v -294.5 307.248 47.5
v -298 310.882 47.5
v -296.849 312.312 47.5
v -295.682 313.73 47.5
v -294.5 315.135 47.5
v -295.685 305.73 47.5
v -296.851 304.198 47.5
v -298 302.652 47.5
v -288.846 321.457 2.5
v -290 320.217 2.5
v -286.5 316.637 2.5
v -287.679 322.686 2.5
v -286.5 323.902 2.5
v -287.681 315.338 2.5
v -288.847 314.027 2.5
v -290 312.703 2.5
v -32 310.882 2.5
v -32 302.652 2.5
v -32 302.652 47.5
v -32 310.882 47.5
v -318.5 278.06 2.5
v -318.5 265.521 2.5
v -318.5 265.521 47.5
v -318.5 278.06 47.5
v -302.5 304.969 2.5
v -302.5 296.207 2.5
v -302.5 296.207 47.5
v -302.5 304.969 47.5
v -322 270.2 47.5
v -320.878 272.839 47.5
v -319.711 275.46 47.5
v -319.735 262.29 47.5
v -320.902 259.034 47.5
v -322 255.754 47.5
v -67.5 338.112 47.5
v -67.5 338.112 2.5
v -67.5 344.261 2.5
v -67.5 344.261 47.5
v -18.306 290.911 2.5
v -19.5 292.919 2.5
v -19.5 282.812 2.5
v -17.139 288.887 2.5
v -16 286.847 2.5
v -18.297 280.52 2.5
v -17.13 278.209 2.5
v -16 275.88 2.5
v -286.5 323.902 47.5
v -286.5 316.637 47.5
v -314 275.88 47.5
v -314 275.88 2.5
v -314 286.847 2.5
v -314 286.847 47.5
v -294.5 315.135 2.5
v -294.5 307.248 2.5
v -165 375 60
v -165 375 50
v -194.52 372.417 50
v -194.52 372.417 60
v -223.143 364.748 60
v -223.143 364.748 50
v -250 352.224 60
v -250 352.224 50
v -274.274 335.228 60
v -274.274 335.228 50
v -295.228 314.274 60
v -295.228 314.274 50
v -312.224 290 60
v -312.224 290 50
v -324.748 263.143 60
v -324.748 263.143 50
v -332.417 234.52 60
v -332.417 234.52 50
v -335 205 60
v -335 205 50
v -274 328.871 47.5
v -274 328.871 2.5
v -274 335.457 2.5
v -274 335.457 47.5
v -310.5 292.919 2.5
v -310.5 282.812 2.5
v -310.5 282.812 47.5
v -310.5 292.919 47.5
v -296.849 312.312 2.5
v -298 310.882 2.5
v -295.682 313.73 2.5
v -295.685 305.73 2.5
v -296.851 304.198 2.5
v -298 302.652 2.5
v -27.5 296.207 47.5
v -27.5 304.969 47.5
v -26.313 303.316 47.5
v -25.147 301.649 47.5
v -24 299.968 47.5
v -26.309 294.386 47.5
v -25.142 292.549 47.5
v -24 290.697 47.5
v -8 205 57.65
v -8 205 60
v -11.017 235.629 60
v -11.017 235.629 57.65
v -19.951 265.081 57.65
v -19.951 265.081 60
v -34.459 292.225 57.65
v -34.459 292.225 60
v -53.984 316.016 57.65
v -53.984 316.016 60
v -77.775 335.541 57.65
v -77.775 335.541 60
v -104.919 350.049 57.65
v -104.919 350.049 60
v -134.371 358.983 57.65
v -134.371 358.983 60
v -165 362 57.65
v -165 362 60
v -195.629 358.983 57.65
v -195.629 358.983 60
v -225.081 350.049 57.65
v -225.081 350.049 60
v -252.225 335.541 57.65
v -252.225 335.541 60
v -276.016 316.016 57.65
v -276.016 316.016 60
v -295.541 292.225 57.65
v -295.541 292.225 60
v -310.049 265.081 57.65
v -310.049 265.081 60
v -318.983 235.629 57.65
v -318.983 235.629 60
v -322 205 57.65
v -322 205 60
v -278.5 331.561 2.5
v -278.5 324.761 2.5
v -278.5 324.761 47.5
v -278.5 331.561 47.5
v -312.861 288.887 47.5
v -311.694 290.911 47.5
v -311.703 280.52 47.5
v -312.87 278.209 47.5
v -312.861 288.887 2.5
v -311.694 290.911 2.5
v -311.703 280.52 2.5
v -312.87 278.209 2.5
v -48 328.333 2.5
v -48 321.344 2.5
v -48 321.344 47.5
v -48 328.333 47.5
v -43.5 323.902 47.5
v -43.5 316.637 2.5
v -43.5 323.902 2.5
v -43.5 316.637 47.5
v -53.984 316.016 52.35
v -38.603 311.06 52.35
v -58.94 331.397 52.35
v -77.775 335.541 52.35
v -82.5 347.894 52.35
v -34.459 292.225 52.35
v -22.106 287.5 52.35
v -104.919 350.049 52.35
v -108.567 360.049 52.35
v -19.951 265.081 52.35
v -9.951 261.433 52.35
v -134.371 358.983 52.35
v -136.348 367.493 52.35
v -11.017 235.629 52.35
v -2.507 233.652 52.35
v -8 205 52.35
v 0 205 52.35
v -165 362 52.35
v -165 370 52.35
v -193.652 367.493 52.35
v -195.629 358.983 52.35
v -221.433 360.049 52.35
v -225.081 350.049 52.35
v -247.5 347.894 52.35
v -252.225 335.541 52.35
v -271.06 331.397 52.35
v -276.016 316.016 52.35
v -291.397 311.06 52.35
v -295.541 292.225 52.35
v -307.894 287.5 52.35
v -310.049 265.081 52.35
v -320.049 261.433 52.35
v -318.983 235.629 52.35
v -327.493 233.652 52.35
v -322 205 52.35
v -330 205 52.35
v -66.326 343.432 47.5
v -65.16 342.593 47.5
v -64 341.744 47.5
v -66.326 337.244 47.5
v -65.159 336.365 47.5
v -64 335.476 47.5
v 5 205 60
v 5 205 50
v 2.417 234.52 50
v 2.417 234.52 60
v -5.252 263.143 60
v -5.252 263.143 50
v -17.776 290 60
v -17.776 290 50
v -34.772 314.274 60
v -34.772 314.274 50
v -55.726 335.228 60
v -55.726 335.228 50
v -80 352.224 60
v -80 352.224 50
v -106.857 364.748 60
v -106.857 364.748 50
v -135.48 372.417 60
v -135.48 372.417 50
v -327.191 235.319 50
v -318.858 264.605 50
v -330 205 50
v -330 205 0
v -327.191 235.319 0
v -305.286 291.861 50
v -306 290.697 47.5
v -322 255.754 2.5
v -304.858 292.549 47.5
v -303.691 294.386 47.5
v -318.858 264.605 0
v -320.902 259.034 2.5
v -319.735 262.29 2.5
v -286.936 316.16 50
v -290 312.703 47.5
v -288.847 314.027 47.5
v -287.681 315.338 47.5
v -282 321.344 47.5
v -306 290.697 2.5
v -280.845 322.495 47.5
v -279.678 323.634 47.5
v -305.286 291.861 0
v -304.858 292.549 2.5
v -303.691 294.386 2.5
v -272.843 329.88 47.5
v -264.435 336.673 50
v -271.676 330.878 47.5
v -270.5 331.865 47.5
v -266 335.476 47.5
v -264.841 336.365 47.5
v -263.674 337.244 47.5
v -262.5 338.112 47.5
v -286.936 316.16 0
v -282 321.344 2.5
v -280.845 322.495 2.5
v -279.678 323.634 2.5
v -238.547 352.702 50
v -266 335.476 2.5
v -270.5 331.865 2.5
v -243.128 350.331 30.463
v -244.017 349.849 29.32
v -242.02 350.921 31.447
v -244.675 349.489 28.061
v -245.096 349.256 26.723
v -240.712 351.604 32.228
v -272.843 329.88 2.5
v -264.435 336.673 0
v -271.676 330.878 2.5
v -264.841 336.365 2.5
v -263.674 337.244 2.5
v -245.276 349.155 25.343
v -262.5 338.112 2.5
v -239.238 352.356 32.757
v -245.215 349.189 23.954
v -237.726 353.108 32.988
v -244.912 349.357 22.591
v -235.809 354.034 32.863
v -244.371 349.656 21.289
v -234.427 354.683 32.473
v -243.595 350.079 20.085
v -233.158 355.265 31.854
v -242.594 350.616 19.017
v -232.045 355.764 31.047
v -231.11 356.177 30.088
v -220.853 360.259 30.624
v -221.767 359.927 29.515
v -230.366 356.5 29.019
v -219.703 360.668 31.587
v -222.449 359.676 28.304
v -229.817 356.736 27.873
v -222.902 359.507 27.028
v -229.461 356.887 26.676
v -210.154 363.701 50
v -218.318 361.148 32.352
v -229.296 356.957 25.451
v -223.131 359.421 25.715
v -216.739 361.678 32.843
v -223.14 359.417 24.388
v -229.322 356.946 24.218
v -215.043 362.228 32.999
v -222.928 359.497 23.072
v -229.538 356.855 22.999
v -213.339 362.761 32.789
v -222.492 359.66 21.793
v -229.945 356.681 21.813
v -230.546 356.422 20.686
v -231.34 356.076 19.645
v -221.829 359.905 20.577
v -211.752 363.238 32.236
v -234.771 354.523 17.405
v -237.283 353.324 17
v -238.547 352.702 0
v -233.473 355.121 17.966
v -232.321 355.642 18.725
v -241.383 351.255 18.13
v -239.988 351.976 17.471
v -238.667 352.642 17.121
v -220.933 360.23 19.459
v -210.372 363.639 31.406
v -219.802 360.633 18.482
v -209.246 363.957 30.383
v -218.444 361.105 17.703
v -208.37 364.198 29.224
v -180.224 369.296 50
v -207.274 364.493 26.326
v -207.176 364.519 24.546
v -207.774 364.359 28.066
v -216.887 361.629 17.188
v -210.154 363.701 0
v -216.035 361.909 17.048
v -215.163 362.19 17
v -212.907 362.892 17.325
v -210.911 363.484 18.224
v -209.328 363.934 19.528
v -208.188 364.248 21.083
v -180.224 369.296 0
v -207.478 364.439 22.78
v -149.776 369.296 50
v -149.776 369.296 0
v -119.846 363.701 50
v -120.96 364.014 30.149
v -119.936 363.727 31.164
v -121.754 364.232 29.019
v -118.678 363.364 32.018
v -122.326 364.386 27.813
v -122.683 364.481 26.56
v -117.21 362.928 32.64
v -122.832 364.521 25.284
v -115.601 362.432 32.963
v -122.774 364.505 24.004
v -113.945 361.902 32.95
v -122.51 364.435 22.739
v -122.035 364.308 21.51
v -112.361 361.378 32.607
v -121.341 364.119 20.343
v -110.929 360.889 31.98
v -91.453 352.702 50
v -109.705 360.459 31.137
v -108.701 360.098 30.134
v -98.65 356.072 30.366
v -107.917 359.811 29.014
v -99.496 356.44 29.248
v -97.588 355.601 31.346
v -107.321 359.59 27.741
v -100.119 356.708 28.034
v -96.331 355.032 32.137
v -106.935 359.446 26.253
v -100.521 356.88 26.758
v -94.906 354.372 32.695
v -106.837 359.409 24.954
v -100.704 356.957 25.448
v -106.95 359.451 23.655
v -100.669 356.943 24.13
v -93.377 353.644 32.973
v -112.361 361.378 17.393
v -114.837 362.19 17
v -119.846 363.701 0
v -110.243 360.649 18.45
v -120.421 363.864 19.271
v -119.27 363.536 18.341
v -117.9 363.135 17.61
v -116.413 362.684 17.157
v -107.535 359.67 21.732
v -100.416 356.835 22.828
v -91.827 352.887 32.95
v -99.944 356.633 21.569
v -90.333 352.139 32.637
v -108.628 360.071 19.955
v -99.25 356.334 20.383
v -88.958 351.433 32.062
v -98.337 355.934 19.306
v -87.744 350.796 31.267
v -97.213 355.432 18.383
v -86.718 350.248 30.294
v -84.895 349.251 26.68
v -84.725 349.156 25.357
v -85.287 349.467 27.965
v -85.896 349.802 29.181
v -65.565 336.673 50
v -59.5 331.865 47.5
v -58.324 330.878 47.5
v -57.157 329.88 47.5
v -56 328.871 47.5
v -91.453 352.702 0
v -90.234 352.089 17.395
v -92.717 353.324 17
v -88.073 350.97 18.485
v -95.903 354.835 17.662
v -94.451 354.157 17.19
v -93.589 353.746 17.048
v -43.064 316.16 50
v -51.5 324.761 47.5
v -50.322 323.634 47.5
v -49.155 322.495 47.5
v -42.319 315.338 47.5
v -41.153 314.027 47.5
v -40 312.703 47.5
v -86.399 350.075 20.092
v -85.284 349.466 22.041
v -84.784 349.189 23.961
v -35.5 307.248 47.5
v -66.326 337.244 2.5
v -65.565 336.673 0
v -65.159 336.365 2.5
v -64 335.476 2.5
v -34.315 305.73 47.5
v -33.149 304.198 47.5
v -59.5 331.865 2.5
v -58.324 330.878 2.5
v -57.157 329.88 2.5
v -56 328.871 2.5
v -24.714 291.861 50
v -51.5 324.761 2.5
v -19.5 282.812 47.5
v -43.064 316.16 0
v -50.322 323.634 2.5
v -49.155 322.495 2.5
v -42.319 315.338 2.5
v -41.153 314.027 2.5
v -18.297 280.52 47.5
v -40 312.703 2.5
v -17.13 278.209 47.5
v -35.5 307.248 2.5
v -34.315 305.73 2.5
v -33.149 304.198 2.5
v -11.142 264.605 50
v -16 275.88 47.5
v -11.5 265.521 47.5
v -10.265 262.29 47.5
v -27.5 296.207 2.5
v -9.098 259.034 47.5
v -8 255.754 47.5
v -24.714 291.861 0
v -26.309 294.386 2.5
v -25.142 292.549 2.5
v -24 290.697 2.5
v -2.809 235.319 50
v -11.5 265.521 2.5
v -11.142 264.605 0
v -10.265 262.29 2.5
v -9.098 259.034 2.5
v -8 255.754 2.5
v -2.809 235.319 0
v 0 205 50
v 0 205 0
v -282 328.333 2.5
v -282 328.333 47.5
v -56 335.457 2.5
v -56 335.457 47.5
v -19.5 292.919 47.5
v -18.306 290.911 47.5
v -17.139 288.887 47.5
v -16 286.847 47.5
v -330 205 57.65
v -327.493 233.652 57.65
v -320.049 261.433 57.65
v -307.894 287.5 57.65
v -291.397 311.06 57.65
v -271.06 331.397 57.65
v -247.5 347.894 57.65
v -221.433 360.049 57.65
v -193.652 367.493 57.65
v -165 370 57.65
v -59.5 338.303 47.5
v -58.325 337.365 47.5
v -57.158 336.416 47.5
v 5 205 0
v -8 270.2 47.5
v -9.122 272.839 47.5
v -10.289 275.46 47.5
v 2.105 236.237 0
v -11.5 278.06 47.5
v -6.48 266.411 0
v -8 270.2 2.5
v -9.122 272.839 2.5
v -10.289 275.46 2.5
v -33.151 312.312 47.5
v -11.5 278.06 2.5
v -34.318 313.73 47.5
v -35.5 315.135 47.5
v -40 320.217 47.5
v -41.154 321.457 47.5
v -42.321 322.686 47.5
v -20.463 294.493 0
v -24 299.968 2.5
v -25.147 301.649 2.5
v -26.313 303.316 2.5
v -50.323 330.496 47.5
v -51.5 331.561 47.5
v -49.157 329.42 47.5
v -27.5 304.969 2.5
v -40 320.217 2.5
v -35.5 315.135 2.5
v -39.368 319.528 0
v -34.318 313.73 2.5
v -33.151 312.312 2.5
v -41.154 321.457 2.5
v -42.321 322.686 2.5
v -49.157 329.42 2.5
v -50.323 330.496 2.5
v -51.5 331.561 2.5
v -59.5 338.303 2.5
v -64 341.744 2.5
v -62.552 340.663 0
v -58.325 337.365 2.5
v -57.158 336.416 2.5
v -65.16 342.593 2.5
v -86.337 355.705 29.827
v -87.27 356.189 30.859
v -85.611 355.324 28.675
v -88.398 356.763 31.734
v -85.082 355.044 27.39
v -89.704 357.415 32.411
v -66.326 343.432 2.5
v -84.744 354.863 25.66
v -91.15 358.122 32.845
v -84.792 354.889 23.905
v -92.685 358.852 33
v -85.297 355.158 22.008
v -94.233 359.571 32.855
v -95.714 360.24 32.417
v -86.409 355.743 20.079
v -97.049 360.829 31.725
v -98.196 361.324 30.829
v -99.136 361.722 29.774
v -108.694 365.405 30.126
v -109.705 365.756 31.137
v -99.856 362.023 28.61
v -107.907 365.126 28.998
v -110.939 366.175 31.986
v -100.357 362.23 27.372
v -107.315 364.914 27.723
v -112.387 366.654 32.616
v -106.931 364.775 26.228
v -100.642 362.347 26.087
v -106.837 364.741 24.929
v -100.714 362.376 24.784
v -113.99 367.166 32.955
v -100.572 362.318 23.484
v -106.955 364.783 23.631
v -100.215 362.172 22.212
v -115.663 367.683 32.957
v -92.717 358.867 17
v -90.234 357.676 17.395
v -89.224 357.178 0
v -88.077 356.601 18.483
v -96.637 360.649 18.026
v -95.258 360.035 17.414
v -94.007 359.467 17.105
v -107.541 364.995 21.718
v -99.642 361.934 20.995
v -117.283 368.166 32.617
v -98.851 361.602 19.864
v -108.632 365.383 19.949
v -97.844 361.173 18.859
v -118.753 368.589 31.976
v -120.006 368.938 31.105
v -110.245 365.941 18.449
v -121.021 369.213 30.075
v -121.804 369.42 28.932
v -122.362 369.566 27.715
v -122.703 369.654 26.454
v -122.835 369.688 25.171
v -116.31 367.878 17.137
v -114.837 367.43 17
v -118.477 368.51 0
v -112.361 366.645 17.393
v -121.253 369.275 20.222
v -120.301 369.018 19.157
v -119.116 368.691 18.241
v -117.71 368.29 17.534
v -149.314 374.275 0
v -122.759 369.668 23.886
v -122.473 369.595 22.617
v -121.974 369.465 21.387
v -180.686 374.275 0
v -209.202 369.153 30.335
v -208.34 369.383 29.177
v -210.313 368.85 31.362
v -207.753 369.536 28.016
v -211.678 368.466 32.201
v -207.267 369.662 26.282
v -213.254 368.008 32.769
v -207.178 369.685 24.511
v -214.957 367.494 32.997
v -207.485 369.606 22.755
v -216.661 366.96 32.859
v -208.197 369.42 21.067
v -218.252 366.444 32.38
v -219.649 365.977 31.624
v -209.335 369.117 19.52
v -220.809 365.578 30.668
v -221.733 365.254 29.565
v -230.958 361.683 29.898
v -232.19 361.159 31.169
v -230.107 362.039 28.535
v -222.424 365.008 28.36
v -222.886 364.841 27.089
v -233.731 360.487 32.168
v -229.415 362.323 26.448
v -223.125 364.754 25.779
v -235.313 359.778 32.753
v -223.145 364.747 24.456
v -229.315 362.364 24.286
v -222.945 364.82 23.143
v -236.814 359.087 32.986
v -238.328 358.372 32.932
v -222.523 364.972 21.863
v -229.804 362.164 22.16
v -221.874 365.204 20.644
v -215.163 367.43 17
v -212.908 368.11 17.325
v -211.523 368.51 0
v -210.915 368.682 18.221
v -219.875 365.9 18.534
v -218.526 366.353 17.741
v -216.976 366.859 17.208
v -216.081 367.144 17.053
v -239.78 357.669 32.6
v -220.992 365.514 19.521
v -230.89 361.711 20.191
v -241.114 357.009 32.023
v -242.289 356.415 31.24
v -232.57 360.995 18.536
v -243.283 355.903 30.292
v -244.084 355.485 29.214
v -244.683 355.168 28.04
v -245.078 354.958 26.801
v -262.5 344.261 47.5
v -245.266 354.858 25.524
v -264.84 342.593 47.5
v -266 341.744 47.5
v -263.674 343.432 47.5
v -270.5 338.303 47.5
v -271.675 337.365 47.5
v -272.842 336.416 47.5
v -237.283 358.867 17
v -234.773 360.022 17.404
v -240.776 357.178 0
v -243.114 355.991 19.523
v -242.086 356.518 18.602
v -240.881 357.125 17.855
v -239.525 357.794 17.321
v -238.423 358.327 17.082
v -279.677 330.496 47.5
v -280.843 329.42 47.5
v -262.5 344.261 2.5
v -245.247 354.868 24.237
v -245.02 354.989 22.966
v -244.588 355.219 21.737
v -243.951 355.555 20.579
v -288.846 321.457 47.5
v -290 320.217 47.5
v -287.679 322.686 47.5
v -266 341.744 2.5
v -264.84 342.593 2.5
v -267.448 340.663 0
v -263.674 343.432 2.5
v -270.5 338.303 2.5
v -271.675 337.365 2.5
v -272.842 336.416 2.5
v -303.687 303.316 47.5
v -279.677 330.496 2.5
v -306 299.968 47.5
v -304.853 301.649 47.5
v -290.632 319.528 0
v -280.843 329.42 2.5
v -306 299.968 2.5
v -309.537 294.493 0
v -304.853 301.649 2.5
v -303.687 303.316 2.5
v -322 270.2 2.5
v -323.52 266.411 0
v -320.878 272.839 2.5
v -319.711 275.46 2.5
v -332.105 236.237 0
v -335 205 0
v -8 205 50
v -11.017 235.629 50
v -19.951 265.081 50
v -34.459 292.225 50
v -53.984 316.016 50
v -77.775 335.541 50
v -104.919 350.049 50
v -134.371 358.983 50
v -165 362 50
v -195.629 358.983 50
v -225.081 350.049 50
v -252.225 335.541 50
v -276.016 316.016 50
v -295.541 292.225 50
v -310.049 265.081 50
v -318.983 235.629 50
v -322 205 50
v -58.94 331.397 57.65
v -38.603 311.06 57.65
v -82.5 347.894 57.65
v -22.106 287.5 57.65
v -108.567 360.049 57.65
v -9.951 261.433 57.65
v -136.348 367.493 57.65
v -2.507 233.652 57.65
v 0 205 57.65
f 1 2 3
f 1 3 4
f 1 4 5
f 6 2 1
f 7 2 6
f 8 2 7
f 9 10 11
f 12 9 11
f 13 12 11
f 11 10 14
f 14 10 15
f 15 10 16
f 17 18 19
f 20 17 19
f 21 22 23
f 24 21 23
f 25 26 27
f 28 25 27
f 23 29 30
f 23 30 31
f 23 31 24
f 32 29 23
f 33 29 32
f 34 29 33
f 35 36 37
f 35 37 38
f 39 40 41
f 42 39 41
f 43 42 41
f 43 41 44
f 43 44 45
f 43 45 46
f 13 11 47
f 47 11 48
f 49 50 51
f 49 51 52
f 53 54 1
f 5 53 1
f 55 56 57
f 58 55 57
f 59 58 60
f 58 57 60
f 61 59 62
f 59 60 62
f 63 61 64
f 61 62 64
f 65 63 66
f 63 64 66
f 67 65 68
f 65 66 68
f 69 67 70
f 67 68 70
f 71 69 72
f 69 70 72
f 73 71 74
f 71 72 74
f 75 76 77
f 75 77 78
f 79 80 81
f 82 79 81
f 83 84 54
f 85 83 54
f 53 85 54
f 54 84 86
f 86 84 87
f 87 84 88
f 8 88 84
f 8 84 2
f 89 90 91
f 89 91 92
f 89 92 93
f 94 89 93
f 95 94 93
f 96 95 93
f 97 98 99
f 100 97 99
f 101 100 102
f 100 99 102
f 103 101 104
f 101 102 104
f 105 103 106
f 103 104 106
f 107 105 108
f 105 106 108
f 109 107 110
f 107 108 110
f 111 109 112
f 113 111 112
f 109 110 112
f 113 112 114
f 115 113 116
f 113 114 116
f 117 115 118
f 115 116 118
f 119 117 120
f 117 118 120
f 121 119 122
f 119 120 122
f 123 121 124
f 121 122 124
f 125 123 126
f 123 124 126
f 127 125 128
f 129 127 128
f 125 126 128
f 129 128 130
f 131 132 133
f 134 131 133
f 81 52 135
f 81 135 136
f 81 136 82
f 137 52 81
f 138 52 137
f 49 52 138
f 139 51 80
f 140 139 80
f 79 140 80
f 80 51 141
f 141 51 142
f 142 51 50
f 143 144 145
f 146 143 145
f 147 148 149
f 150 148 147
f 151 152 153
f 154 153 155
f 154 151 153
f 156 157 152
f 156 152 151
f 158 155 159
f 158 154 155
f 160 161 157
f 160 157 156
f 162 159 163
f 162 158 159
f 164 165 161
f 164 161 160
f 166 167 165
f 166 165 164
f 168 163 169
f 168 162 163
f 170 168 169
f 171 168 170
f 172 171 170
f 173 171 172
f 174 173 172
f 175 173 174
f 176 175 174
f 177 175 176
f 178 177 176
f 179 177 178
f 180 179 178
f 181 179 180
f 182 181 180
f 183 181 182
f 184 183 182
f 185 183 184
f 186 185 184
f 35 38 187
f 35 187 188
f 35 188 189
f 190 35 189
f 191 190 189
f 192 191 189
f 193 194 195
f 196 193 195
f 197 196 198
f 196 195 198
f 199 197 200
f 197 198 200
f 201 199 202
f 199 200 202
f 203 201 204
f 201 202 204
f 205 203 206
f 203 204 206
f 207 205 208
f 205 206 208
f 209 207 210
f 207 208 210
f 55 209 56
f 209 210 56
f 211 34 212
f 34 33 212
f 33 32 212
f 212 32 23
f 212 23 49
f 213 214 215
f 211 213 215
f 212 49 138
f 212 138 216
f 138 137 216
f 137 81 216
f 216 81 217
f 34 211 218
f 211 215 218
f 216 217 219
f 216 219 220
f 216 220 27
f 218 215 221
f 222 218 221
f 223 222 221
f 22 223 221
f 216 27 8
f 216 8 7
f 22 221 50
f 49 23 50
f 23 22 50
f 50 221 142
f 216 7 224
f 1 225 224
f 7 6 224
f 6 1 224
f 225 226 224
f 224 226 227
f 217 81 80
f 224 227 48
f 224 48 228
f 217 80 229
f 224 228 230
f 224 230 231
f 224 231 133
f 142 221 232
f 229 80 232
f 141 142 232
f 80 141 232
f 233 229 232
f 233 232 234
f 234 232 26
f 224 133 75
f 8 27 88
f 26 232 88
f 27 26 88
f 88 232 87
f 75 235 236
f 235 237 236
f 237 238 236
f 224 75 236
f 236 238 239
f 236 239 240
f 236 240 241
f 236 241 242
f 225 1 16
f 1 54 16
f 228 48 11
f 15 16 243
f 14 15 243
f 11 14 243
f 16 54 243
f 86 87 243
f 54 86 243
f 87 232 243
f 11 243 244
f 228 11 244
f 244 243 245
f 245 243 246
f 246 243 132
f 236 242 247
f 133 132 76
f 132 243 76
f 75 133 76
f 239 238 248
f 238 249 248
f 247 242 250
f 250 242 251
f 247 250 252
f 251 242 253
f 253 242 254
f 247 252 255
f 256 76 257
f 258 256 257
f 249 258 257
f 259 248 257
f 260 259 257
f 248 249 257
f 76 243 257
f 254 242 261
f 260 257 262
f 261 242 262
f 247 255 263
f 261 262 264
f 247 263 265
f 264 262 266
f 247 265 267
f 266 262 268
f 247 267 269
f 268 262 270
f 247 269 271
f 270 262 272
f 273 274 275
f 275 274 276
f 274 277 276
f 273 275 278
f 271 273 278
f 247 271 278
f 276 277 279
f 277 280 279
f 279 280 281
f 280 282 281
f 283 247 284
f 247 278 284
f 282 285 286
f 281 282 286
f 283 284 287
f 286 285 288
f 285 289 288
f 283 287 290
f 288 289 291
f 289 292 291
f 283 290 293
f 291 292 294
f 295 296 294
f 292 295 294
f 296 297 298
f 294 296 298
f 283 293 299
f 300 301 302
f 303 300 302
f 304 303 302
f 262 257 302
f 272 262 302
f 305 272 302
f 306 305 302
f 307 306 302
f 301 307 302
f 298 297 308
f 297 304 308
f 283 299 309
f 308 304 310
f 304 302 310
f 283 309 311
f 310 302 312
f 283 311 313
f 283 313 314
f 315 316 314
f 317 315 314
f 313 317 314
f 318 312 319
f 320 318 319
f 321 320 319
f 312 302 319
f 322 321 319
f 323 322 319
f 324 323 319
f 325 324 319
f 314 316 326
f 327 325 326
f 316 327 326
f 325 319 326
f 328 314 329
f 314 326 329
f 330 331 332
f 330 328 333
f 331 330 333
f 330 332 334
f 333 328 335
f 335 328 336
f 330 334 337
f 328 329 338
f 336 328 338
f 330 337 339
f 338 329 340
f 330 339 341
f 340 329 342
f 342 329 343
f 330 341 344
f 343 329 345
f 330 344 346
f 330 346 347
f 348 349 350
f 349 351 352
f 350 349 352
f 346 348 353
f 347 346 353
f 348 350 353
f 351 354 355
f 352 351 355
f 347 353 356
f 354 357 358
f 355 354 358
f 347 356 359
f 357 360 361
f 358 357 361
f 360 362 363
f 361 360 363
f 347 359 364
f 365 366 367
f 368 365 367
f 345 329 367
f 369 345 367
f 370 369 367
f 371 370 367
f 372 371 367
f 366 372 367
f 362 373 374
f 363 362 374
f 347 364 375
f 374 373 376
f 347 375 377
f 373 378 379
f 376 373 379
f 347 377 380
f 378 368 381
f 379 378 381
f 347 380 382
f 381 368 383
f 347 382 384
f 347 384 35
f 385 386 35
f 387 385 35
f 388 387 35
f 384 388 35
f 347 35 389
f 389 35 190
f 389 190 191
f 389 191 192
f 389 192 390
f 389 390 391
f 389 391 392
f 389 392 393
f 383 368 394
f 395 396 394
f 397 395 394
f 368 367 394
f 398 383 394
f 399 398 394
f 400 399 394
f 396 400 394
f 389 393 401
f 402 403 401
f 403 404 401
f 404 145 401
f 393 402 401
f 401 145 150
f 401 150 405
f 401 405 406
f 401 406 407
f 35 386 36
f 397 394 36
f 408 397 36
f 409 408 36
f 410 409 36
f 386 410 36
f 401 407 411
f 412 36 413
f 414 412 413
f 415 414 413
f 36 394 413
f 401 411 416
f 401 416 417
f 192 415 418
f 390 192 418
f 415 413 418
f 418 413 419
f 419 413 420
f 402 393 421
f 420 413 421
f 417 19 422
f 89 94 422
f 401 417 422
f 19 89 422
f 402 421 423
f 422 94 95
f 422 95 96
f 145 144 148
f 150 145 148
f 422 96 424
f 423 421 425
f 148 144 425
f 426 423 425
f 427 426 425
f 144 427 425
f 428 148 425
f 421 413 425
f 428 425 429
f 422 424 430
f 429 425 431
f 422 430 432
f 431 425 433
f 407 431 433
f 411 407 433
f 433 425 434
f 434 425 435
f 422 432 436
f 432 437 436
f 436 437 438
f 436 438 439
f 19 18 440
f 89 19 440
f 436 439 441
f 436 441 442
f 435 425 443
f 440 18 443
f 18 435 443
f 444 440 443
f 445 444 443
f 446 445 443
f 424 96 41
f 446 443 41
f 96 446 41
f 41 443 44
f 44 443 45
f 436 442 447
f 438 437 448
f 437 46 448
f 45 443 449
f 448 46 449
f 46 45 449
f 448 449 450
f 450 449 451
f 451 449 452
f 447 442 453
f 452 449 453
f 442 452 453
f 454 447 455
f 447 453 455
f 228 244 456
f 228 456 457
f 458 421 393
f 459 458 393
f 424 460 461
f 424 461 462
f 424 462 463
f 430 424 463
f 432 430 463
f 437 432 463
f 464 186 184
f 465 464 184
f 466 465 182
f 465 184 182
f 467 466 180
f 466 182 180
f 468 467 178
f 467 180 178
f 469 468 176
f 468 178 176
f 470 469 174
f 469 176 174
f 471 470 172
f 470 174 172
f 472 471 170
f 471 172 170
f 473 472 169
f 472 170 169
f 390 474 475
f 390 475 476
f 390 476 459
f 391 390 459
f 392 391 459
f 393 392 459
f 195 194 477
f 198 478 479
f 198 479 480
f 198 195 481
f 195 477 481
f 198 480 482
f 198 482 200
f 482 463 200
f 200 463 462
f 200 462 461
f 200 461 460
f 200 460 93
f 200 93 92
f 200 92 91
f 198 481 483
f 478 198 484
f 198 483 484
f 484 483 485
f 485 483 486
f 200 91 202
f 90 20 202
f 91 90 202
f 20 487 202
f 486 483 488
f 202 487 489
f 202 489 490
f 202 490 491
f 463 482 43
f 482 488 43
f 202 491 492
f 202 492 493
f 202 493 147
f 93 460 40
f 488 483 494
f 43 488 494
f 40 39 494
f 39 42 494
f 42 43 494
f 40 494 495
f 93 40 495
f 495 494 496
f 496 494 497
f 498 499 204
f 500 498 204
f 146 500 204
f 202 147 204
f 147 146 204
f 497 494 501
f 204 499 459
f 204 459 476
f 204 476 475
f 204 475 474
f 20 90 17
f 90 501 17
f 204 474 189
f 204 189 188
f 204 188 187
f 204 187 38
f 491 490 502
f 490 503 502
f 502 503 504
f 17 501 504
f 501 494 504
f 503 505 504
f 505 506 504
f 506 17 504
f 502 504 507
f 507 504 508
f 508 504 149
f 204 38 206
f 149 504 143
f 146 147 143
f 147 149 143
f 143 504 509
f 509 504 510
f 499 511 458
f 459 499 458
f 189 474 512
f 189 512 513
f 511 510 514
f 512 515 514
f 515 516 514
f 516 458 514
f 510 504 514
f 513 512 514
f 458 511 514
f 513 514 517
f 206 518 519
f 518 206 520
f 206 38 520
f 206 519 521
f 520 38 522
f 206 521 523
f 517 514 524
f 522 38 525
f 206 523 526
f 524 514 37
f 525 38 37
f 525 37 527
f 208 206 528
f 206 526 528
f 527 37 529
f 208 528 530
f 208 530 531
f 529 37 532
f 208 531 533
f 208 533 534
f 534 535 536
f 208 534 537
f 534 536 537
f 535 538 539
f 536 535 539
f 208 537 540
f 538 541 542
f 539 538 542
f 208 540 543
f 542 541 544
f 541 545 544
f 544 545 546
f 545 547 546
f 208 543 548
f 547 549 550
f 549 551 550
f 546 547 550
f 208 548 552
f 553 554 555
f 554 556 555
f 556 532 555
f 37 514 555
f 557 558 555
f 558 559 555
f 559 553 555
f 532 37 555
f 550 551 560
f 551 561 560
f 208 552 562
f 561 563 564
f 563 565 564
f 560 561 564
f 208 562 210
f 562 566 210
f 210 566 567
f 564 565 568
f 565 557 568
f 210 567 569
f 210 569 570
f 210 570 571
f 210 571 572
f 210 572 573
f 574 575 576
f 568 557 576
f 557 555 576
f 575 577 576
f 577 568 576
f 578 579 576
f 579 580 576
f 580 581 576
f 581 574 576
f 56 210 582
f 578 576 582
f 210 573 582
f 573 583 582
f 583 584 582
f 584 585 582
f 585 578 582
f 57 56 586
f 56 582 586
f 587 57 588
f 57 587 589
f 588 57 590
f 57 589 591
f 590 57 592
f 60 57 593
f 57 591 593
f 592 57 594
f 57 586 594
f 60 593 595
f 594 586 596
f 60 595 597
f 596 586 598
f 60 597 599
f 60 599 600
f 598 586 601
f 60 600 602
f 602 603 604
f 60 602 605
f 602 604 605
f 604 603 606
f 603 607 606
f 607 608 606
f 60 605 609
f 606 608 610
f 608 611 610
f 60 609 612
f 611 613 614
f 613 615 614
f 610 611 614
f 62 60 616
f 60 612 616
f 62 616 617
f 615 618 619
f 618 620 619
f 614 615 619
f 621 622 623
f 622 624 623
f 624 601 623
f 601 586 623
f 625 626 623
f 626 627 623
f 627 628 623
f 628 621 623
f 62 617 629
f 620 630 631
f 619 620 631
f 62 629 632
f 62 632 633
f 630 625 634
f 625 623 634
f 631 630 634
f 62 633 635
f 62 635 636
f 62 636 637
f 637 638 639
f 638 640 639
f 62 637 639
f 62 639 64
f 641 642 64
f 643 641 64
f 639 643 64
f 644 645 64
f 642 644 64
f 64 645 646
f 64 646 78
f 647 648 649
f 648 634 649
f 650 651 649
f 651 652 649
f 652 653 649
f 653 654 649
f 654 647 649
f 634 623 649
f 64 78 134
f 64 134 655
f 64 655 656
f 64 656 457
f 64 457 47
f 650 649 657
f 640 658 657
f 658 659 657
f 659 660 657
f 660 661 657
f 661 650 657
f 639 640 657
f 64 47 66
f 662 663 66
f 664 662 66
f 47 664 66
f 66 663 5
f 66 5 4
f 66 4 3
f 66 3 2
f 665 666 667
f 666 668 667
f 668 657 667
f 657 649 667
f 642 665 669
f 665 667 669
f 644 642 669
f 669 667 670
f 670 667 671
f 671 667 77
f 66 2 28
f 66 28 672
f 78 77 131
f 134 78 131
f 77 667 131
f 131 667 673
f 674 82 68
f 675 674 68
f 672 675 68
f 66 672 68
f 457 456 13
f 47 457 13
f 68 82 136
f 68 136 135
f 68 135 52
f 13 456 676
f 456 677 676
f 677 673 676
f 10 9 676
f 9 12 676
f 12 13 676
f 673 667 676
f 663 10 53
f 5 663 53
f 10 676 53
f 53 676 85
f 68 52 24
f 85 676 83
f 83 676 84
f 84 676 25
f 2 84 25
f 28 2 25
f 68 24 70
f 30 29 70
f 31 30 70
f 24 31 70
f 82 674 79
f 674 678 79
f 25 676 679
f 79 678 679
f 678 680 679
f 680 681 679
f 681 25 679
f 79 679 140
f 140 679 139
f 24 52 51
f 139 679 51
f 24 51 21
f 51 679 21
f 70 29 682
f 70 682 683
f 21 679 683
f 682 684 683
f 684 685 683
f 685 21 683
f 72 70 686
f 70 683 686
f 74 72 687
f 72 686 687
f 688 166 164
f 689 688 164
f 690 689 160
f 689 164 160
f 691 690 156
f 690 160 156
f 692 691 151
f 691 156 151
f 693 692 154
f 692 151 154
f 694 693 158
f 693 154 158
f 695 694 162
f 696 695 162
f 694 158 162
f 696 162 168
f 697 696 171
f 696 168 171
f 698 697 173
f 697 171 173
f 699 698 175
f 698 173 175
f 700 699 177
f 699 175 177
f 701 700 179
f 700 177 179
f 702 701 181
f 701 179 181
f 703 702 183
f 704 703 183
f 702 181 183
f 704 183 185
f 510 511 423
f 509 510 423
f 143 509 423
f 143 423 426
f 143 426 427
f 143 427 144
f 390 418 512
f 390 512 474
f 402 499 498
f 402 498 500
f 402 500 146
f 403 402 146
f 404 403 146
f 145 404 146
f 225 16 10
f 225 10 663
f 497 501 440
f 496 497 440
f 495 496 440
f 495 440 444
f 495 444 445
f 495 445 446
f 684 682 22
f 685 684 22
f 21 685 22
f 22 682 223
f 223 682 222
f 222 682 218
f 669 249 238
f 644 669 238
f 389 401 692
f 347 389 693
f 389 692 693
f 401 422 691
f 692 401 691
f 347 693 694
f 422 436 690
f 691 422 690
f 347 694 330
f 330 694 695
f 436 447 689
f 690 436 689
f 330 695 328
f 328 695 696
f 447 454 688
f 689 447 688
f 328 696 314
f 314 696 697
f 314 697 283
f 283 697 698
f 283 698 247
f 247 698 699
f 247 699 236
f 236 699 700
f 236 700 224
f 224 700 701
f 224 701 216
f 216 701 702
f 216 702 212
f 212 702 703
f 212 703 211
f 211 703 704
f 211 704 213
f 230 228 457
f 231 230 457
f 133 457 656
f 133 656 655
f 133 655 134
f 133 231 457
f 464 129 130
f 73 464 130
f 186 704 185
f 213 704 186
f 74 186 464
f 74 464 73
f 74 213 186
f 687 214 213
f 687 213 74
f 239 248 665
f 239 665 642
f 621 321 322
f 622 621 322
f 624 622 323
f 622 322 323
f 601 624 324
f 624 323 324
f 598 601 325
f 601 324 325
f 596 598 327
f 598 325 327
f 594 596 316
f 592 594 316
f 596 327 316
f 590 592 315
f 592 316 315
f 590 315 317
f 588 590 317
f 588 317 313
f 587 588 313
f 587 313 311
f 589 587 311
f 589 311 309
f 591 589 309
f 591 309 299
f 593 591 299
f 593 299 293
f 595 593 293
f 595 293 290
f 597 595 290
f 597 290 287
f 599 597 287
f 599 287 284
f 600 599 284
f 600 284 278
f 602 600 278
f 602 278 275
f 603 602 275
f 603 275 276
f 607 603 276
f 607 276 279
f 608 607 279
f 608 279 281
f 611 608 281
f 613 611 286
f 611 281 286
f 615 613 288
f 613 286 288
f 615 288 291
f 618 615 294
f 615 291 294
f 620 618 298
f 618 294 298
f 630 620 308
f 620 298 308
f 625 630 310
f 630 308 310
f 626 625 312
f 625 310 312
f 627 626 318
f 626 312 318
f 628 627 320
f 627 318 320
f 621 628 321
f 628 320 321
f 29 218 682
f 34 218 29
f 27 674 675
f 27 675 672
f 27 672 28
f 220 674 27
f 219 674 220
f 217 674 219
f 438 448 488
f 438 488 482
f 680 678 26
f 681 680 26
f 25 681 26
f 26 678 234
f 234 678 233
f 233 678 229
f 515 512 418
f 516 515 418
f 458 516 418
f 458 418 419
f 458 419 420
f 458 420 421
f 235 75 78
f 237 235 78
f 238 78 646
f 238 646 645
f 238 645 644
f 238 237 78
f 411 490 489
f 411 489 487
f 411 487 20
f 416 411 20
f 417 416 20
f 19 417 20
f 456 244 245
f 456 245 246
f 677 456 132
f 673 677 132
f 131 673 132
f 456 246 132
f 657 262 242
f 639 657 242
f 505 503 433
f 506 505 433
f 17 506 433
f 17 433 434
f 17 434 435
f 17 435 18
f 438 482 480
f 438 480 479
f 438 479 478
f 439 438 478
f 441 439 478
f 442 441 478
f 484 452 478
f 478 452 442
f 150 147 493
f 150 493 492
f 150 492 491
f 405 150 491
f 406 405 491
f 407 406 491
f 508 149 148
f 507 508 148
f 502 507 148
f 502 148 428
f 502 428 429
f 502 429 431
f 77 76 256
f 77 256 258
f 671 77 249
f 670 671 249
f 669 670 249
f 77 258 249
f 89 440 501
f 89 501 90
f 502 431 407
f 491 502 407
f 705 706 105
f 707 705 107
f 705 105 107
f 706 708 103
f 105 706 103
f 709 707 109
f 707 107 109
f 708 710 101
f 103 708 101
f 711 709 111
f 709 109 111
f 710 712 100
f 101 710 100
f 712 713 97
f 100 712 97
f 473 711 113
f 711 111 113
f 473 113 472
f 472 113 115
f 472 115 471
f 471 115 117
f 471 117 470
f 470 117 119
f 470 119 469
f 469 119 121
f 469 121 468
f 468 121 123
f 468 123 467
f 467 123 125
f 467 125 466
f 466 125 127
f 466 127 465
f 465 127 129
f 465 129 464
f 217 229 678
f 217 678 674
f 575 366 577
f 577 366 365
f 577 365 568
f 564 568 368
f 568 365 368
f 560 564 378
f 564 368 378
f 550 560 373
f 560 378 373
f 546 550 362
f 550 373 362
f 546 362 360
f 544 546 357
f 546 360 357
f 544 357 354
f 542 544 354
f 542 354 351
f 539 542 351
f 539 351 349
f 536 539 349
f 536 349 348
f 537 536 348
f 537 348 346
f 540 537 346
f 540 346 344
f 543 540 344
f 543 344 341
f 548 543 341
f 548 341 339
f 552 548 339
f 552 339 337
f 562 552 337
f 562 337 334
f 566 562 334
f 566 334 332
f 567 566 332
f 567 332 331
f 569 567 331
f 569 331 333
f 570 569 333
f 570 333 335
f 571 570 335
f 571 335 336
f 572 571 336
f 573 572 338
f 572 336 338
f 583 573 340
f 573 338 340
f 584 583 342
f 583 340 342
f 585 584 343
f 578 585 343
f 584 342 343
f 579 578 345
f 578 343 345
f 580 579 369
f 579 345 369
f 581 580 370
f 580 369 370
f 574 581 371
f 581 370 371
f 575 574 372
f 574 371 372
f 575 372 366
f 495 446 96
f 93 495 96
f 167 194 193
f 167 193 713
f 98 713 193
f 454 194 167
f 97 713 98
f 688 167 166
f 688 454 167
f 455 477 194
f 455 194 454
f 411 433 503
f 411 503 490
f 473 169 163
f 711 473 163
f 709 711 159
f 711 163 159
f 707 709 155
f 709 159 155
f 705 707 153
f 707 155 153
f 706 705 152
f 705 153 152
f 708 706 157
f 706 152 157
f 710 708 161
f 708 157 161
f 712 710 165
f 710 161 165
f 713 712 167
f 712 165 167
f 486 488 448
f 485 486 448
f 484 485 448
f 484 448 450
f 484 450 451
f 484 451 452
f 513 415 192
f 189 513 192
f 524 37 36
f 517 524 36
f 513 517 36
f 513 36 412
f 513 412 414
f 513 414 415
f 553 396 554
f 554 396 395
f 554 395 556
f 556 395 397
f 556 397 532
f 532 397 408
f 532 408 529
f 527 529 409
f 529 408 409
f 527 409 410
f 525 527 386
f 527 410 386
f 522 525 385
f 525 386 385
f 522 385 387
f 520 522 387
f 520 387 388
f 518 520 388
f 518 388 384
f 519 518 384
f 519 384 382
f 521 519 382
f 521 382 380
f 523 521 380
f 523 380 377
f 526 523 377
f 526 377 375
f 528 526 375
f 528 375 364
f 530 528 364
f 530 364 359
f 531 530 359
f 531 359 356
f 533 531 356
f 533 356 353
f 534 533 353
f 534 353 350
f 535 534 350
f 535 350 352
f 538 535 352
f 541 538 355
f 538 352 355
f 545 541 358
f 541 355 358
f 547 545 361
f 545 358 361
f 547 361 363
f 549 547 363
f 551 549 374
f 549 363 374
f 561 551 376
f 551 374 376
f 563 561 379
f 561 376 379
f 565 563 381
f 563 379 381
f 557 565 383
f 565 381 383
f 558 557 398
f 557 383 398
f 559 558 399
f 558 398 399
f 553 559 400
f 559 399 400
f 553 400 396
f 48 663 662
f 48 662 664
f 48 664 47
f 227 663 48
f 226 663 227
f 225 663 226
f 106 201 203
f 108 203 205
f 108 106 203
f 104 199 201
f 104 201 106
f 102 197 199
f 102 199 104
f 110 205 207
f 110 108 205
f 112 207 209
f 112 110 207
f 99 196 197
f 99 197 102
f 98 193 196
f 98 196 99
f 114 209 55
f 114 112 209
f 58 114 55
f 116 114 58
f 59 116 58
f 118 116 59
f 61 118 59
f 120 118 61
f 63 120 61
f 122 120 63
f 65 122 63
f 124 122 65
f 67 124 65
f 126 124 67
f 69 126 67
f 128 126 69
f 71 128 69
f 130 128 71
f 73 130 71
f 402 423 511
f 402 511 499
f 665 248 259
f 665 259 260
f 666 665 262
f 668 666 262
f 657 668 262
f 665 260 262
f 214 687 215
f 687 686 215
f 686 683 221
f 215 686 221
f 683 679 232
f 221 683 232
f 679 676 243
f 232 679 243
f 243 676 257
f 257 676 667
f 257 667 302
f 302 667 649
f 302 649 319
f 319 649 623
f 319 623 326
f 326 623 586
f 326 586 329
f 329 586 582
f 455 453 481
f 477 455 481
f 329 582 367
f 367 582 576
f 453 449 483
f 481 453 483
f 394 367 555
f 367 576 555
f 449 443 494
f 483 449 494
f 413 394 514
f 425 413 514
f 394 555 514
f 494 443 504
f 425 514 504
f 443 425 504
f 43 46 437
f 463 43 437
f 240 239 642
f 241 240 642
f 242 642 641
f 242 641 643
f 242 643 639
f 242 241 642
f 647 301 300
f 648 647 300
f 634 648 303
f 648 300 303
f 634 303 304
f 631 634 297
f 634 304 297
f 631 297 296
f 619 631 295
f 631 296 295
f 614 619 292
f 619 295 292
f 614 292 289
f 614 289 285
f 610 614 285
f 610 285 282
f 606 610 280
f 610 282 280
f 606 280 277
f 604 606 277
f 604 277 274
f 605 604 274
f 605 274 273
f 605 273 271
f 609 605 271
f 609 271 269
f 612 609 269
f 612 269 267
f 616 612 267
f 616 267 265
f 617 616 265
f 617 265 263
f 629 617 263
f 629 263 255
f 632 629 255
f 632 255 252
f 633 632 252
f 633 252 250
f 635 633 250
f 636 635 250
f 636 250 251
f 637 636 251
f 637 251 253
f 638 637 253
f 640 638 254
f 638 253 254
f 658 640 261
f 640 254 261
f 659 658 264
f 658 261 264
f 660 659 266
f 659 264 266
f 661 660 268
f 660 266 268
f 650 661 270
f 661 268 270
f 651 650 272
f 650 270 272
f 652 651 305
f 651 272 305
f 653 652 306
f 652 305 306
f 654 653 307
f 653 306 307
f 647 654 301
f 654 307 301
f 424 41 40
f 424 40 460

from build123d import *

# Parameters (mm, degrees)
BOSS_EXTRU_1_DEPTH      = 50
ESQUISSE2_W             = 3.5
ESQUISSE2_H             = 45
ENL_V_MAT_EXTRU_1_DEPTH = 1500
ESQUISSE3_R             = 8
ENL_V_MAT_EXTRU_3_DEPTH = 1500
BOSS_EXTRU_2_DEPTH      = 10
BOSS_EXTRU_4_REACH      = 382.427
ESQUISSE5_W             = 330
ESQUISSE5_H             = 2.35
ESQUISSE8_R             = 157
ENL_V_MAT_EXTRU_4_DEPTH = 94


with BuildPart() as part:
    # Esquisse1 → Boss.-Extru.1 (new body)
    with BuildSketch(Plane.XY):
        with BuildLine():
            Line((-335, 205), (-330, 205))
            ThreePointArc((-330, 205), (-165, 370), (0, 205))
            Line((0, 205), (5, 205))
            ThreePointArc((5, 205), (-165, 375), (-335, 205))
        make_face()
    extrude(amount=BOSS_EXTRU_1_DEPTH)

    # Esquisse2 → Enlèv. mat.-Extru.1 (cut)
    with BuildSketch(Plane.XZ.offset(-205)):
        with Locations((-320.25, 25)):
            Rectangle(ESQUISSE2_W, ESQUISSE2_H)
        with Locations((-312.25, 25)):
            Rectangle(ESQUISSE2_W, ESQUISSE2_H)
        with Locations((-304.25, 25)):
            Rectangle(ESQUISSE2_W, ESQUISSE2_H)
        with Locations((-296.25, 25)):
            Rectangle(ESQUISSE2_W, ESQUISSE2_H)
        with Locations((-288.25, 25)):
            Rectangle(ESQUISSE2_W, ESQUISSE2_H)
        with Locations((-280.25, 25)):
            Rectangle(ESQUISSE2_W, ESQUISSE2_H)
        with Locations((-272.25, 25)):
            Rectangle(ESQUISSE2_W, ESQUISSE2_H)
        with Locations((-264.25, 25)):
            Rectangle(ESQUISSE2_W, ESQUISSE2_H)
        with Locations((-9.75, 25)):
            Rectangle(ESQUISSE2_W, ESQUISSE2_H)
        with Locations((-17.75, 25)):
            Rectangle(ESQUISSE2_W, ESQUISSE2_H)
        with Locations((-25.75, 25)):
            Rectangle(ESQUISSE2_W, ESQUISSE2_H)
        with Locations((-33.75, 25)):
            Rectangle(ESQUISSE2_W, ESQUISSE2_H)
        with Locations((-41.75, 25)):
            Rectangle(ESQUISSE2_W, ESQUISSE2_H)
        with Locations((-49.75, 25)):
            Rectangle(ESQUISSE2_W, ESQUISSE2_H)
        with Locations((-57.75, 25)):
            Rectangle(ESQUISSE2_W, ESQUISSE2_H)
        with Locations((-65.75, 25)):
            Rectangle(ESQUISSE2_W, ESQUISSE2_H)
    extrude(amount=-ENL_V_MAT_EXTRU_1_DEPTH, mode=Mode.SUBTRACT)

    # Esquisse3 → Enlèv. mat.-Extru.3 (cut)
    with BuildSketch(Plane.XZ.offset(-205)):
        with Locations(Location((-92.71665832, 25, 0), (0, 0, 270))):
            Circle(ESQUISSE3_R)
        with Locations(Location((-114.83665832, 25, 0), (0, 0, 270))):
            Circle(ESQUISSE3_R)
        with Locations(Location((-237.28334168, 25, 0), (0, 0, 270))):
            Circle(ESQUISSE3_R)
        with Locations(Location((-215.16334168, 25, 0), (0, 0, 270))):
            Circle(ESQUISSE3_R)
    extrude(amount=-ENL_V_MAT_EXTRU_3_DEPTH, mode=Mode.SUBTRACT)

    # Esquisse4 → Boss.-Extru.2 (add)
    with BuildSketch(Plane.XY.offset(50)):
        with BuildLine():
            Line((0, 205), (5, 205))
            ThreePointArc((5, 205), (-44.791847198, 325.208152802), (-165, 375))
            ThreePointArc((-165, 375), (-285.208152802, 325.208152802), (-335, 205))
            Line((-335, 205), (-330, 205))
            ThreePointArc((-330, 205), (-281.672618896, 321.672618896), (-165, 370))
            ThreePointArc((-165, 370), (-48.327381104, 321.672618896), (0, 205))
        make_face()
    extrude(amount=BOSS_EXTRU_2_DEPTH)

    # Esquisse5 → Boss.-Extru.4 (add, up to next)
    with BuildSketch(Plane(origin=(0, 205, 0), x_dir=(-1, 0, 0), z_dir=(0, -1, 0)), mode=Mode.PRIVATE) as boss_extru_4_sk1:
        with Locations((165, -58.825)):
            Rectangle(ESQUISSE5_W, ESQUISSE5_H)
    boss_extru_4_tool1 = extrude(boss_extru_4_sk1.sketch, amount=-BOSS_EXTRU_4_REACH, mode=Mode.PRIVATE) - part.part
    # Esquisse5 → Boss.-Extru.4 (add, up to next)
    with BuildSketch(Plane(origin=(0, 205, 0), x_dir=(-1, 0, 0), z_dir=(0, -1, 0)), mode=Mode.PRIVATE) as boss_extru_4_sk2:
        with Locations((165, -51.175)):
            Rectangle(ESQUISSE5_W, ESQUISSE5_H)
    boss_extru_4_tool2 = extrude(boss_extru_4_sk2.sketch, amount=-BOSS_EXTRU_4_REACH, mode=Mode.PRIVATE) - part.part
    add(boss_extru_4_tool1.solids().sort_by_distance((-165, 205, 58.825))[0])
    add(boss_extru_4_tool2.solids().sort_by_distance((-165, 205, 51.175))[0])

    # Esquisse8 → Enlèv. mat.-Extru.4 (cut)
    with BuildSketch(Plane.XY.offset(60)):
        with Locations((-165, 205)):
            Circle(ESQUISSE8_R)
    extrude(amount=-ENL_V_MAT_EXTRU_4_DEPTH, mode=Mode.SUBTRACT)


solid = part.part
